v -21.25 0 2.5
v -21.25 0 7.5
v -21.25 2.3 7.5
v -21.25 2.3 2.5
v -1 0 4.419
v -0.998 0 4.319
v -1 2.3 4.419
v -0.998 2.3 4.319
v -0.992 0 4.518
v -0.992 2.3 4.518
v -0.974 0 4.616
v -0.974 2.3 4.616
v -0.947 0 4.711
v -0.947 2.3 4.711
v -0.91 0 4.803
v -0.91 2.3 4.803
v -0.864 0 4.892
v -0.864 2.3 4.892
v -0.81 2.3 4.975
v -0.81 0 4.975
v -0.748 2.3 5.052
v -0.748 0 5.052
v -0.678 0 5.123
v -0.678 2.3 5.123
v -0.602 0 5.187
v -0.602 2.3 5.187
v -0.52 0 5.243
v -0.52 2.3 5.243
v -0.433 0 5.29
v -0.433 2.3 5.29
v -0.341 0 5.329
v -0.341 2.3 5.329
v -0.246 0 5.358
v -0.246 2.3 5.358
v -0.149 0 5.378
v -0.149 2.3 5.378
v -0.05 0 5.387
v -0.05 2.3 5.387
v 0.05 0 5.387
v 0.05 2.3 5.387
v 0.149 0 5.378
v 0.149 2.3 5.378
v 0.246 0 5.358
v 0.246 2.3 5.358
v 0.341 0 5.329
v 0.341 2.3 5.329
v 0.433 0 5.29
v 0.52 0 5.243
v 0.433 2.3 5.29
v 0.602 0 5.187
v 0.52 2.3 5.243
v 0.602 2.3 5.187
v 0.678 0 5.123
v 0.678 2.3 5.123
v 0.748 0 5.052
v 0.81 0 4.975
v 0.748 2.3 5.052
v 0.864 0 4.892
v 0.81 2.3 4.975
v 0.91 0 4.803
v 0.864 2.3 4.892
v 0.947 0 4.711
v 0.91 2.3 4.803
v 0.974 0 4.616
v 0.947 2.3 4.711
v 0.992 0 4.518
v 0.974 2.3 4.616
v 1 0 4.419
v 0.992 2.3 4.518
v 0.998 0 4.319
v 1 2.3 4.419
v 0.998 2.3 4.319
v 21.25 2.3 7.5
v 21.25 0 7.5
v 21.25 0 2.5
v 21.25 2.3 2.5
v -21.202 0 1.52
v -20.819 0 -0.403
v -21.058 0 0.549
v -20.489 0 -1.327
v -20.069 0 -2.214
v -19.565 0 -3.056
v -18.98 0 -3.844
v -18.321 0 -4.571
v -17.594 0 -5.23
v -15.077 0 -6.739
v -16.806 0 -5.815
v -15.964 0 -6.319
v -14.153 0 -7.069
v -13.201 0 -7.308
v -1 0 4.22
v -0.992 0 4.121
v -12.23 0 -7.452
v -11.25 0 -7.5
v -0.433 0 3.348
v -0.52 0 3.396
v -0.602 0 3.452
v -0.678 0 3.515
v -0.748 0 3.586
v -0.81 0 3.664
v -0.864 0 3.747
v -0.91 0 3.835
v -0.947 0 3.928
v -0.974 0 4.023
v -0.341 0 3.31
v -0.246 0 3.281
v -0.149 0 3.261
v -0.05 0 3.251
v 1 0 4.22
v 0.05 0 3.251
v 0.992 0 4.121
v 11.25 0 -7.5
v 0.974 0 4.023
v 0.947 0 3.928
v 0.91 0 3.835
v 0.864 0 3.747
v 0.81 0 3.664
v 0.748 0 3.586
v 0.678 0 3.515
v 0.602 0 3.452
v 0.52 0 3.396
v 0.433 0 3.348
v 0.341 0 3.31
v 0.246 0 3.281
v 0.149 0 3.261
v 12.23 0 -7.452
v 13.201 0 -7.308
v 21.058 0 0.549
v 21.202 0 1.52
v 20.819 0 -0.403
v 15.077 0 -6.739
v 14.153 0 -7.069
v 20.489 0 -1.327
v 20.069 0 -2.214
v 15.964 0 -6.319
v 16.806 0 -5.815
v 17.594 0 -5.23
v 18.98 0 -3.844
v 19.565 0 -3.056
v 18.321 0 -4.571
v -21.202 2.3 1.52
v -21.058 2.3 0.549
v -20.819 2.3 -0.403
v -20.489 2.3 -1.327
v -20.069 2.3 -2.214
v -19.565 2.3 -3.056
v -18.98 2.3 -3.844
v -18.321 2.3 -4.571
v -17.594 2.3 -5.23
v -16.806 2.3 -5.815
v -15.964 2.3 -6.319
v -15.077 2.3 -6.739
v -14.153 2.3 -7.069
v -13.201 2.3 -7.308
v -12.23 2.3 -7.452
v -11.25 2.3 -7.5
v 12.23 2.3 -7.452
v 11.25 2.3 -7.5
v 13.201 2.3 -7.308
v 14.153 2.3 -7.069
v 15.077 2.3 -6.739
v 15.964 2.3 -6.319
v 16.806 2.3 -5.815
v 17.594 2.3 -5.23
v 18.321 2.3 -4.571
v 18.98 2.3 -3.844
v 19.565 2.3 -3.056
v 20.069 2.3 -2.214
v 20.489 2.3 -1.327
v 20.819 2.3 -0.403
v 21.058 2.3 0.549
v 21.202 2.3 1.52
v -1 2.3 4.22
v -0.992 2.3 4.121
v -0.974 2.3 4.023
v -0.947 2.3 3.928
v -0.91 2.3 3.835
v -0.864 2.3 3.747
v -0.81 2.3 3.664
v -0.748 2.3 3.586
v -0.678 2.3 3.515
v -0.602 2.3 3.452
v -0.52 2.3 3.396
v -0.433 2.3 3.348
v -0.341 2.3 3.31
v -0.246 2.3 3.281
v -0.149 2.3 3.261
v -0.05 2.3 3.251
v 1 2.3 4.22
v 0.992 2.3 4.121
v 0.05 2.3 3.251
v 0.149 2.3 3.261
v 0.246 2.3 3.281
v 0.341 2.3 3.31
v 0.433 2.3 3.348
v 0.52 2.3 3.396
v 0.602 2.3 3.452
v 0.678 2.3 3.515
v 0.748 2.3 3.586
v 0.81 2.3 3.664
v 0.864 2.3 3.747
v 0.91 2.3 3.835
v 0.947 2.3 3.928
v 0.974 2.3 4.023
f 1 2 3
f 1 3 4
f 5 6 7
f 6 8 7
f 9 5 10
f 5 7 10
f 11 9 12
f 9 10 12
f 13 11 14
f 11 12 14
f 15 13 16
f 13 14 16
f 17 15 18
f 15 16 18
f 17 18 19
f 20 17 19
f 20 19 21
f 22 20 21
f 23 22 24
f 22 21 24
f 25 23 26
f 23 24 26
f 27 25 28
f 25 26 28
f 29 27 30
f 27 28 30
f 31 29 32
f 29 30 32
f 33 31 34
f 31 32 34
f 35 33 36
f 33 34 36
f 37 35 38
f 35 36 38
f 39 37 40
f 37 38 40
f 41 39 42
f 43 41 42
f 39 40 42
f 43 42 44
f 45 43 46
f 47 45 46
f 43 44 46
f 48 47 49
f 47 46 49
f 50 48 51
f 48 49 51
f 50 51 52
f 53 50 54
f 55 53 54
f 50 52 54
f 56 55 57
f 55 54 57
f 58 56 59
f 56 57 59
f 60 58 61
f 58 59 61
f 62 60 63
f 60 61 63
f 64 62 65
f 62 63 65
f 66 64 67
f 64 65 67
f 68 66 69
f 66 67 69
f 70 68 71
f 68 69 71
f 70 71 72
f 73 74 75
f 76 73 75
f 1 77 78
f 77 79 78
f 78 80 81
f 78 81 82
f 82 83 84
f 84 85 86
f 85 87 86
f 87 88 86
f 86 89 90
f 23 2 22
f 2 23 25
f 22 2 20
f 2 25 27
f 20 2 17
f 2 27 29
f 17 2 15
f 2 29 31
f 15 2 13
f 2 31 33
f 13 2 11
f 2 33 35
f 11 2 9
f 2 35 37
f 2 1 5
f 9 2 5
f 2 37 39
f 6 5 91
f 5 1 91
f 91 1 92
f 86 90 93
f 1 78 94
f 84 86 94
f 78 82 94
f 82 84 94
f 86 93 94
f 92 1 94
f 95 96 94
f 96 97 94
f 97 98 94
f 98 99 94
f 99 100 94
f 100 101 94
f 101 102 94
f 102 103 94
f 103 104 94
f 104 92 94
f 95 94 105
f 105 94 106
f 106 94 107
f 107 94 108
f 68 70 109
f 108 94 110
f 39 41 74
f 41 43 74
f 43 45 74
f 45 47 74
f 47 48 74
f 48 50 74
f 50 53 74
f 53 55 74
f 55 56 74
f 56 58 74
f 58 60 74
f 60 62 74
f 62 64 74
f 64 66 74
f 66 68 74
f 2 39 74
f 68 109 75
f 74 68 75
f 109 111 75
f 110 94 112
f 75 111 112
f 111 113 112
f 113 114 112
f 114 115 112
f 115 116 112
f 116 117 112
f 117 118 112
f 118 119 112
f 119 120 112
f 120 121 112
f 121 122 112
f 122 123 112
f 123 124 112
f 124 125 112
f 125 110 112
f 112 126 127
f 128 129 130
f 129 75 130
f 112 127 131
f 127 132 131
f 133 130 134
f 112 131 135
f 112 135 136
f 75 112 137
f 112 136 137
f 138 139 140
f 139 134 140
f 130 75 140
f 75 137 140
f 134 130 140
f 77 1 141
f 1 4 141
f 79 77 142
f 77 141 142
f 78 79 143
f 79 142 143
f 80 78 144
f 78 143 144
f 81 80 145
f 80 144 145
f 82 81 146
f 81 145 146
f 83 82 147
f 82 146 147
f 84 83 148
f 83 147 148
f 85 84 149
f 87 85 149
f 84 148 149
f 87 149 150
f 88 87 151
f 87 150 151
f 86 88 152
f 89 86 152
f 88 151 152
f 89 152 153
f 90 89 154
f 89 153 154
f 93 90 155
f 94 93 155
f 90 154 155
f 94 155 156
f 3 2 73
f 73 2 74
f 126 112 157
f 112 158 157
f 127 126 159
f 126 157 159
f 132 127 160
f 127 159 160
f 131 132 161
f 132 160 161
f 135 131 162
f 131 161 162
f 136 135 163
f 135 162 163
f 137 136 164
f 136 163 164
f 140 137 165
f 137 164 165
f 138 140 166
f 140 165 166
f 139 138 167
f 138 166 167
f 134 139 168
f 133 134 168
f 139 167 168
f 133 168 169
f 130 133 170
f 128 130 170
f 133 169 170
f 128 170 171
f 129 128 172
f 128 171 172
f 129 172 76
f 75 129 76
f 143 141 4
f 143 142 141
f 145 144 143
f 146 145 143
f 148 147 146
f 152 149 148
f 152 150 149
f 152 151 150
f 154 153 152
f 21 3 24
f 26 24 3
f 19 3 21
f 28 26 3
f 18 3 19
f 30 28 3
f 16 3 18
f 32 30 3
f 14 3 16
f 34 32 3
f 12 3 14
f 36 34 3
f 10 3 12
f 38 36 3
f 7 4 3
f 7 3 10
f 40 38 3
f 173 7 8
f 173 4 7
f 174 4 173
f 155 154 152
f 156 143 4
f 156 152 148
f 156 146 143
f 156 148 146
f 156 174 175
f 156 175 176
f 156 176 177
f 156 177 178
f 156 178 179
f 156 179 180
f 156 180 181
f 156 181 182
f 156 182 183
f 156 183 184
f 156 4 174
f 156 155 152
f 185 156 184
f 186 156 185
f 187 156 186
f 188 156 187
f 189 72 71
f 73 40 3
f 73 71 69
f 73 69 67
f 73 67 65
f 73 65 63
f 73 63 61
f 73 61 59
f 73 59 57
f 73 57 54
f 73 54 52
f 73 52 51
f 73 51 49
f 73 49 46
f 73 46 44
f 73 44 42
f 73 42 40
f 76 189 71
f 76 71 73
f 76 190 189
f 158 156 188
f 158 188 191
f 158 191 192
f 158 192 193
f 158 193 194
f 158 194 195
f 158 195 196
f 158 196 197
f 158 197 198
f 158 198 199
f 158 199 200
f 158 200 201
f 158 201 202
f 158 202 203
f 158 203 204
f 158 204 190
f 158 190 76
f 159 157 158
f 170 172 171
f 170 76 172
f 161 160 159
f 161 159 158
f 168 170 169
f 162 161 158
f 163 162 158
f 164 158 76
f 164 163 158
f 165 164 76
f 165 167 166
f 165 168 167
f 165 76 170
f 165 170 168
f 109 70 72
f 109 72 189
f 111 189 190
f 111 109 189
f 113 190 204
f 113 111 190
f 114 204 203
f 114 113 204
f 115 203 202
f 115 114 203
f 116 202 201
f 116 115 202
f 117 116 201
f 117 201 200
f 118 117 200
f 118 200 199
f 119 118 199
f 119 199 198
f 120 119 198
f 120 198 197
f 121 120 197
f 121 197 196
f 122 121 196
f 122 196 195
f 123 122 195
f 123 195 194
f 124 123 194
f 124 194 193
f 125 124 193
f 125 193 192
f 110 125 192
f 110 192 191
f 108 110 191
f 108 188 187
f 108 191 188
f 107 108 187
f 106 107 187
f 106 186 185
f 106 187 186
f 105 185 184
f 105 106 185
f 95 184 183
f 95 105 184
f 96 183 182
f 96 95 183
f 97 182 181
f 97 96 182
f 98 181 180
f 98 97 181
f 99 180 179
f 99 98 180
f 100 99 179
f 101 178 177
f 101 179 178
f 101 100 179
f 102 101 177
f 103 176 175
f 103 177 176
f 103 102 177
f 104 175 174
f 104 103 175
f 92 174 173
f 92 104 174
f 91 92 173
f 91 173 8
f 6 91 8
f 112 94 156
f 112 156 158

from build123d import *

# Parameters (mm, degrees)
SKETCH2_W           = 42.5
SKETCH2_H           = 15
SKETCH2_R           = 1
BOSS_EXTRUDE1_DEPTH = 2.3
FILLET9_R           = 10
SKETCH3_R           = 1
CUT_EXTRUDE1_DEPTH  = 3.3


with BuildPart() as part:
    # Sketch2 → Boss-Extrude1 (new body)
    with BuildSketch(Plane(origin=(0, 0, 0), x_dir=(1, 0, 0), z_dir=(0, 1, 0))):
        Rectangle(SKETCH2_W, SKETCH2_H)
        with Locations((0, -4.25)):
            Circle(SKETCH2_R, mode=Mode.SUBTRACT)
    extrude(amount=BOSS_EXTRUDE1_DEPTH)

    # Fillet9
    fillet9_edges = [part.edges().sort_by_distance(p)[0] for p in [
        (-21.25, 1.15, -7.5),
        (21.25, 1.15, -7.5),
    ]]
    fillet(fillet9_edges, radius=FILLET9_R)

    # Sketch3 → Cut-Extrude1 (cut, through all)
    with BuildSketch(Plane(origin=(0, 2.3, 0), x_dir=(1, 0, 0), z_dir=(0, 1, 0))):
        with Locations((0, -4.388678083)):
            Circle(SKETCH3_R)
    extrude(amount=-CUT_EXTRUDE1_DEPTH, mode=Mode.SUBTRACT)


solid = part.part
